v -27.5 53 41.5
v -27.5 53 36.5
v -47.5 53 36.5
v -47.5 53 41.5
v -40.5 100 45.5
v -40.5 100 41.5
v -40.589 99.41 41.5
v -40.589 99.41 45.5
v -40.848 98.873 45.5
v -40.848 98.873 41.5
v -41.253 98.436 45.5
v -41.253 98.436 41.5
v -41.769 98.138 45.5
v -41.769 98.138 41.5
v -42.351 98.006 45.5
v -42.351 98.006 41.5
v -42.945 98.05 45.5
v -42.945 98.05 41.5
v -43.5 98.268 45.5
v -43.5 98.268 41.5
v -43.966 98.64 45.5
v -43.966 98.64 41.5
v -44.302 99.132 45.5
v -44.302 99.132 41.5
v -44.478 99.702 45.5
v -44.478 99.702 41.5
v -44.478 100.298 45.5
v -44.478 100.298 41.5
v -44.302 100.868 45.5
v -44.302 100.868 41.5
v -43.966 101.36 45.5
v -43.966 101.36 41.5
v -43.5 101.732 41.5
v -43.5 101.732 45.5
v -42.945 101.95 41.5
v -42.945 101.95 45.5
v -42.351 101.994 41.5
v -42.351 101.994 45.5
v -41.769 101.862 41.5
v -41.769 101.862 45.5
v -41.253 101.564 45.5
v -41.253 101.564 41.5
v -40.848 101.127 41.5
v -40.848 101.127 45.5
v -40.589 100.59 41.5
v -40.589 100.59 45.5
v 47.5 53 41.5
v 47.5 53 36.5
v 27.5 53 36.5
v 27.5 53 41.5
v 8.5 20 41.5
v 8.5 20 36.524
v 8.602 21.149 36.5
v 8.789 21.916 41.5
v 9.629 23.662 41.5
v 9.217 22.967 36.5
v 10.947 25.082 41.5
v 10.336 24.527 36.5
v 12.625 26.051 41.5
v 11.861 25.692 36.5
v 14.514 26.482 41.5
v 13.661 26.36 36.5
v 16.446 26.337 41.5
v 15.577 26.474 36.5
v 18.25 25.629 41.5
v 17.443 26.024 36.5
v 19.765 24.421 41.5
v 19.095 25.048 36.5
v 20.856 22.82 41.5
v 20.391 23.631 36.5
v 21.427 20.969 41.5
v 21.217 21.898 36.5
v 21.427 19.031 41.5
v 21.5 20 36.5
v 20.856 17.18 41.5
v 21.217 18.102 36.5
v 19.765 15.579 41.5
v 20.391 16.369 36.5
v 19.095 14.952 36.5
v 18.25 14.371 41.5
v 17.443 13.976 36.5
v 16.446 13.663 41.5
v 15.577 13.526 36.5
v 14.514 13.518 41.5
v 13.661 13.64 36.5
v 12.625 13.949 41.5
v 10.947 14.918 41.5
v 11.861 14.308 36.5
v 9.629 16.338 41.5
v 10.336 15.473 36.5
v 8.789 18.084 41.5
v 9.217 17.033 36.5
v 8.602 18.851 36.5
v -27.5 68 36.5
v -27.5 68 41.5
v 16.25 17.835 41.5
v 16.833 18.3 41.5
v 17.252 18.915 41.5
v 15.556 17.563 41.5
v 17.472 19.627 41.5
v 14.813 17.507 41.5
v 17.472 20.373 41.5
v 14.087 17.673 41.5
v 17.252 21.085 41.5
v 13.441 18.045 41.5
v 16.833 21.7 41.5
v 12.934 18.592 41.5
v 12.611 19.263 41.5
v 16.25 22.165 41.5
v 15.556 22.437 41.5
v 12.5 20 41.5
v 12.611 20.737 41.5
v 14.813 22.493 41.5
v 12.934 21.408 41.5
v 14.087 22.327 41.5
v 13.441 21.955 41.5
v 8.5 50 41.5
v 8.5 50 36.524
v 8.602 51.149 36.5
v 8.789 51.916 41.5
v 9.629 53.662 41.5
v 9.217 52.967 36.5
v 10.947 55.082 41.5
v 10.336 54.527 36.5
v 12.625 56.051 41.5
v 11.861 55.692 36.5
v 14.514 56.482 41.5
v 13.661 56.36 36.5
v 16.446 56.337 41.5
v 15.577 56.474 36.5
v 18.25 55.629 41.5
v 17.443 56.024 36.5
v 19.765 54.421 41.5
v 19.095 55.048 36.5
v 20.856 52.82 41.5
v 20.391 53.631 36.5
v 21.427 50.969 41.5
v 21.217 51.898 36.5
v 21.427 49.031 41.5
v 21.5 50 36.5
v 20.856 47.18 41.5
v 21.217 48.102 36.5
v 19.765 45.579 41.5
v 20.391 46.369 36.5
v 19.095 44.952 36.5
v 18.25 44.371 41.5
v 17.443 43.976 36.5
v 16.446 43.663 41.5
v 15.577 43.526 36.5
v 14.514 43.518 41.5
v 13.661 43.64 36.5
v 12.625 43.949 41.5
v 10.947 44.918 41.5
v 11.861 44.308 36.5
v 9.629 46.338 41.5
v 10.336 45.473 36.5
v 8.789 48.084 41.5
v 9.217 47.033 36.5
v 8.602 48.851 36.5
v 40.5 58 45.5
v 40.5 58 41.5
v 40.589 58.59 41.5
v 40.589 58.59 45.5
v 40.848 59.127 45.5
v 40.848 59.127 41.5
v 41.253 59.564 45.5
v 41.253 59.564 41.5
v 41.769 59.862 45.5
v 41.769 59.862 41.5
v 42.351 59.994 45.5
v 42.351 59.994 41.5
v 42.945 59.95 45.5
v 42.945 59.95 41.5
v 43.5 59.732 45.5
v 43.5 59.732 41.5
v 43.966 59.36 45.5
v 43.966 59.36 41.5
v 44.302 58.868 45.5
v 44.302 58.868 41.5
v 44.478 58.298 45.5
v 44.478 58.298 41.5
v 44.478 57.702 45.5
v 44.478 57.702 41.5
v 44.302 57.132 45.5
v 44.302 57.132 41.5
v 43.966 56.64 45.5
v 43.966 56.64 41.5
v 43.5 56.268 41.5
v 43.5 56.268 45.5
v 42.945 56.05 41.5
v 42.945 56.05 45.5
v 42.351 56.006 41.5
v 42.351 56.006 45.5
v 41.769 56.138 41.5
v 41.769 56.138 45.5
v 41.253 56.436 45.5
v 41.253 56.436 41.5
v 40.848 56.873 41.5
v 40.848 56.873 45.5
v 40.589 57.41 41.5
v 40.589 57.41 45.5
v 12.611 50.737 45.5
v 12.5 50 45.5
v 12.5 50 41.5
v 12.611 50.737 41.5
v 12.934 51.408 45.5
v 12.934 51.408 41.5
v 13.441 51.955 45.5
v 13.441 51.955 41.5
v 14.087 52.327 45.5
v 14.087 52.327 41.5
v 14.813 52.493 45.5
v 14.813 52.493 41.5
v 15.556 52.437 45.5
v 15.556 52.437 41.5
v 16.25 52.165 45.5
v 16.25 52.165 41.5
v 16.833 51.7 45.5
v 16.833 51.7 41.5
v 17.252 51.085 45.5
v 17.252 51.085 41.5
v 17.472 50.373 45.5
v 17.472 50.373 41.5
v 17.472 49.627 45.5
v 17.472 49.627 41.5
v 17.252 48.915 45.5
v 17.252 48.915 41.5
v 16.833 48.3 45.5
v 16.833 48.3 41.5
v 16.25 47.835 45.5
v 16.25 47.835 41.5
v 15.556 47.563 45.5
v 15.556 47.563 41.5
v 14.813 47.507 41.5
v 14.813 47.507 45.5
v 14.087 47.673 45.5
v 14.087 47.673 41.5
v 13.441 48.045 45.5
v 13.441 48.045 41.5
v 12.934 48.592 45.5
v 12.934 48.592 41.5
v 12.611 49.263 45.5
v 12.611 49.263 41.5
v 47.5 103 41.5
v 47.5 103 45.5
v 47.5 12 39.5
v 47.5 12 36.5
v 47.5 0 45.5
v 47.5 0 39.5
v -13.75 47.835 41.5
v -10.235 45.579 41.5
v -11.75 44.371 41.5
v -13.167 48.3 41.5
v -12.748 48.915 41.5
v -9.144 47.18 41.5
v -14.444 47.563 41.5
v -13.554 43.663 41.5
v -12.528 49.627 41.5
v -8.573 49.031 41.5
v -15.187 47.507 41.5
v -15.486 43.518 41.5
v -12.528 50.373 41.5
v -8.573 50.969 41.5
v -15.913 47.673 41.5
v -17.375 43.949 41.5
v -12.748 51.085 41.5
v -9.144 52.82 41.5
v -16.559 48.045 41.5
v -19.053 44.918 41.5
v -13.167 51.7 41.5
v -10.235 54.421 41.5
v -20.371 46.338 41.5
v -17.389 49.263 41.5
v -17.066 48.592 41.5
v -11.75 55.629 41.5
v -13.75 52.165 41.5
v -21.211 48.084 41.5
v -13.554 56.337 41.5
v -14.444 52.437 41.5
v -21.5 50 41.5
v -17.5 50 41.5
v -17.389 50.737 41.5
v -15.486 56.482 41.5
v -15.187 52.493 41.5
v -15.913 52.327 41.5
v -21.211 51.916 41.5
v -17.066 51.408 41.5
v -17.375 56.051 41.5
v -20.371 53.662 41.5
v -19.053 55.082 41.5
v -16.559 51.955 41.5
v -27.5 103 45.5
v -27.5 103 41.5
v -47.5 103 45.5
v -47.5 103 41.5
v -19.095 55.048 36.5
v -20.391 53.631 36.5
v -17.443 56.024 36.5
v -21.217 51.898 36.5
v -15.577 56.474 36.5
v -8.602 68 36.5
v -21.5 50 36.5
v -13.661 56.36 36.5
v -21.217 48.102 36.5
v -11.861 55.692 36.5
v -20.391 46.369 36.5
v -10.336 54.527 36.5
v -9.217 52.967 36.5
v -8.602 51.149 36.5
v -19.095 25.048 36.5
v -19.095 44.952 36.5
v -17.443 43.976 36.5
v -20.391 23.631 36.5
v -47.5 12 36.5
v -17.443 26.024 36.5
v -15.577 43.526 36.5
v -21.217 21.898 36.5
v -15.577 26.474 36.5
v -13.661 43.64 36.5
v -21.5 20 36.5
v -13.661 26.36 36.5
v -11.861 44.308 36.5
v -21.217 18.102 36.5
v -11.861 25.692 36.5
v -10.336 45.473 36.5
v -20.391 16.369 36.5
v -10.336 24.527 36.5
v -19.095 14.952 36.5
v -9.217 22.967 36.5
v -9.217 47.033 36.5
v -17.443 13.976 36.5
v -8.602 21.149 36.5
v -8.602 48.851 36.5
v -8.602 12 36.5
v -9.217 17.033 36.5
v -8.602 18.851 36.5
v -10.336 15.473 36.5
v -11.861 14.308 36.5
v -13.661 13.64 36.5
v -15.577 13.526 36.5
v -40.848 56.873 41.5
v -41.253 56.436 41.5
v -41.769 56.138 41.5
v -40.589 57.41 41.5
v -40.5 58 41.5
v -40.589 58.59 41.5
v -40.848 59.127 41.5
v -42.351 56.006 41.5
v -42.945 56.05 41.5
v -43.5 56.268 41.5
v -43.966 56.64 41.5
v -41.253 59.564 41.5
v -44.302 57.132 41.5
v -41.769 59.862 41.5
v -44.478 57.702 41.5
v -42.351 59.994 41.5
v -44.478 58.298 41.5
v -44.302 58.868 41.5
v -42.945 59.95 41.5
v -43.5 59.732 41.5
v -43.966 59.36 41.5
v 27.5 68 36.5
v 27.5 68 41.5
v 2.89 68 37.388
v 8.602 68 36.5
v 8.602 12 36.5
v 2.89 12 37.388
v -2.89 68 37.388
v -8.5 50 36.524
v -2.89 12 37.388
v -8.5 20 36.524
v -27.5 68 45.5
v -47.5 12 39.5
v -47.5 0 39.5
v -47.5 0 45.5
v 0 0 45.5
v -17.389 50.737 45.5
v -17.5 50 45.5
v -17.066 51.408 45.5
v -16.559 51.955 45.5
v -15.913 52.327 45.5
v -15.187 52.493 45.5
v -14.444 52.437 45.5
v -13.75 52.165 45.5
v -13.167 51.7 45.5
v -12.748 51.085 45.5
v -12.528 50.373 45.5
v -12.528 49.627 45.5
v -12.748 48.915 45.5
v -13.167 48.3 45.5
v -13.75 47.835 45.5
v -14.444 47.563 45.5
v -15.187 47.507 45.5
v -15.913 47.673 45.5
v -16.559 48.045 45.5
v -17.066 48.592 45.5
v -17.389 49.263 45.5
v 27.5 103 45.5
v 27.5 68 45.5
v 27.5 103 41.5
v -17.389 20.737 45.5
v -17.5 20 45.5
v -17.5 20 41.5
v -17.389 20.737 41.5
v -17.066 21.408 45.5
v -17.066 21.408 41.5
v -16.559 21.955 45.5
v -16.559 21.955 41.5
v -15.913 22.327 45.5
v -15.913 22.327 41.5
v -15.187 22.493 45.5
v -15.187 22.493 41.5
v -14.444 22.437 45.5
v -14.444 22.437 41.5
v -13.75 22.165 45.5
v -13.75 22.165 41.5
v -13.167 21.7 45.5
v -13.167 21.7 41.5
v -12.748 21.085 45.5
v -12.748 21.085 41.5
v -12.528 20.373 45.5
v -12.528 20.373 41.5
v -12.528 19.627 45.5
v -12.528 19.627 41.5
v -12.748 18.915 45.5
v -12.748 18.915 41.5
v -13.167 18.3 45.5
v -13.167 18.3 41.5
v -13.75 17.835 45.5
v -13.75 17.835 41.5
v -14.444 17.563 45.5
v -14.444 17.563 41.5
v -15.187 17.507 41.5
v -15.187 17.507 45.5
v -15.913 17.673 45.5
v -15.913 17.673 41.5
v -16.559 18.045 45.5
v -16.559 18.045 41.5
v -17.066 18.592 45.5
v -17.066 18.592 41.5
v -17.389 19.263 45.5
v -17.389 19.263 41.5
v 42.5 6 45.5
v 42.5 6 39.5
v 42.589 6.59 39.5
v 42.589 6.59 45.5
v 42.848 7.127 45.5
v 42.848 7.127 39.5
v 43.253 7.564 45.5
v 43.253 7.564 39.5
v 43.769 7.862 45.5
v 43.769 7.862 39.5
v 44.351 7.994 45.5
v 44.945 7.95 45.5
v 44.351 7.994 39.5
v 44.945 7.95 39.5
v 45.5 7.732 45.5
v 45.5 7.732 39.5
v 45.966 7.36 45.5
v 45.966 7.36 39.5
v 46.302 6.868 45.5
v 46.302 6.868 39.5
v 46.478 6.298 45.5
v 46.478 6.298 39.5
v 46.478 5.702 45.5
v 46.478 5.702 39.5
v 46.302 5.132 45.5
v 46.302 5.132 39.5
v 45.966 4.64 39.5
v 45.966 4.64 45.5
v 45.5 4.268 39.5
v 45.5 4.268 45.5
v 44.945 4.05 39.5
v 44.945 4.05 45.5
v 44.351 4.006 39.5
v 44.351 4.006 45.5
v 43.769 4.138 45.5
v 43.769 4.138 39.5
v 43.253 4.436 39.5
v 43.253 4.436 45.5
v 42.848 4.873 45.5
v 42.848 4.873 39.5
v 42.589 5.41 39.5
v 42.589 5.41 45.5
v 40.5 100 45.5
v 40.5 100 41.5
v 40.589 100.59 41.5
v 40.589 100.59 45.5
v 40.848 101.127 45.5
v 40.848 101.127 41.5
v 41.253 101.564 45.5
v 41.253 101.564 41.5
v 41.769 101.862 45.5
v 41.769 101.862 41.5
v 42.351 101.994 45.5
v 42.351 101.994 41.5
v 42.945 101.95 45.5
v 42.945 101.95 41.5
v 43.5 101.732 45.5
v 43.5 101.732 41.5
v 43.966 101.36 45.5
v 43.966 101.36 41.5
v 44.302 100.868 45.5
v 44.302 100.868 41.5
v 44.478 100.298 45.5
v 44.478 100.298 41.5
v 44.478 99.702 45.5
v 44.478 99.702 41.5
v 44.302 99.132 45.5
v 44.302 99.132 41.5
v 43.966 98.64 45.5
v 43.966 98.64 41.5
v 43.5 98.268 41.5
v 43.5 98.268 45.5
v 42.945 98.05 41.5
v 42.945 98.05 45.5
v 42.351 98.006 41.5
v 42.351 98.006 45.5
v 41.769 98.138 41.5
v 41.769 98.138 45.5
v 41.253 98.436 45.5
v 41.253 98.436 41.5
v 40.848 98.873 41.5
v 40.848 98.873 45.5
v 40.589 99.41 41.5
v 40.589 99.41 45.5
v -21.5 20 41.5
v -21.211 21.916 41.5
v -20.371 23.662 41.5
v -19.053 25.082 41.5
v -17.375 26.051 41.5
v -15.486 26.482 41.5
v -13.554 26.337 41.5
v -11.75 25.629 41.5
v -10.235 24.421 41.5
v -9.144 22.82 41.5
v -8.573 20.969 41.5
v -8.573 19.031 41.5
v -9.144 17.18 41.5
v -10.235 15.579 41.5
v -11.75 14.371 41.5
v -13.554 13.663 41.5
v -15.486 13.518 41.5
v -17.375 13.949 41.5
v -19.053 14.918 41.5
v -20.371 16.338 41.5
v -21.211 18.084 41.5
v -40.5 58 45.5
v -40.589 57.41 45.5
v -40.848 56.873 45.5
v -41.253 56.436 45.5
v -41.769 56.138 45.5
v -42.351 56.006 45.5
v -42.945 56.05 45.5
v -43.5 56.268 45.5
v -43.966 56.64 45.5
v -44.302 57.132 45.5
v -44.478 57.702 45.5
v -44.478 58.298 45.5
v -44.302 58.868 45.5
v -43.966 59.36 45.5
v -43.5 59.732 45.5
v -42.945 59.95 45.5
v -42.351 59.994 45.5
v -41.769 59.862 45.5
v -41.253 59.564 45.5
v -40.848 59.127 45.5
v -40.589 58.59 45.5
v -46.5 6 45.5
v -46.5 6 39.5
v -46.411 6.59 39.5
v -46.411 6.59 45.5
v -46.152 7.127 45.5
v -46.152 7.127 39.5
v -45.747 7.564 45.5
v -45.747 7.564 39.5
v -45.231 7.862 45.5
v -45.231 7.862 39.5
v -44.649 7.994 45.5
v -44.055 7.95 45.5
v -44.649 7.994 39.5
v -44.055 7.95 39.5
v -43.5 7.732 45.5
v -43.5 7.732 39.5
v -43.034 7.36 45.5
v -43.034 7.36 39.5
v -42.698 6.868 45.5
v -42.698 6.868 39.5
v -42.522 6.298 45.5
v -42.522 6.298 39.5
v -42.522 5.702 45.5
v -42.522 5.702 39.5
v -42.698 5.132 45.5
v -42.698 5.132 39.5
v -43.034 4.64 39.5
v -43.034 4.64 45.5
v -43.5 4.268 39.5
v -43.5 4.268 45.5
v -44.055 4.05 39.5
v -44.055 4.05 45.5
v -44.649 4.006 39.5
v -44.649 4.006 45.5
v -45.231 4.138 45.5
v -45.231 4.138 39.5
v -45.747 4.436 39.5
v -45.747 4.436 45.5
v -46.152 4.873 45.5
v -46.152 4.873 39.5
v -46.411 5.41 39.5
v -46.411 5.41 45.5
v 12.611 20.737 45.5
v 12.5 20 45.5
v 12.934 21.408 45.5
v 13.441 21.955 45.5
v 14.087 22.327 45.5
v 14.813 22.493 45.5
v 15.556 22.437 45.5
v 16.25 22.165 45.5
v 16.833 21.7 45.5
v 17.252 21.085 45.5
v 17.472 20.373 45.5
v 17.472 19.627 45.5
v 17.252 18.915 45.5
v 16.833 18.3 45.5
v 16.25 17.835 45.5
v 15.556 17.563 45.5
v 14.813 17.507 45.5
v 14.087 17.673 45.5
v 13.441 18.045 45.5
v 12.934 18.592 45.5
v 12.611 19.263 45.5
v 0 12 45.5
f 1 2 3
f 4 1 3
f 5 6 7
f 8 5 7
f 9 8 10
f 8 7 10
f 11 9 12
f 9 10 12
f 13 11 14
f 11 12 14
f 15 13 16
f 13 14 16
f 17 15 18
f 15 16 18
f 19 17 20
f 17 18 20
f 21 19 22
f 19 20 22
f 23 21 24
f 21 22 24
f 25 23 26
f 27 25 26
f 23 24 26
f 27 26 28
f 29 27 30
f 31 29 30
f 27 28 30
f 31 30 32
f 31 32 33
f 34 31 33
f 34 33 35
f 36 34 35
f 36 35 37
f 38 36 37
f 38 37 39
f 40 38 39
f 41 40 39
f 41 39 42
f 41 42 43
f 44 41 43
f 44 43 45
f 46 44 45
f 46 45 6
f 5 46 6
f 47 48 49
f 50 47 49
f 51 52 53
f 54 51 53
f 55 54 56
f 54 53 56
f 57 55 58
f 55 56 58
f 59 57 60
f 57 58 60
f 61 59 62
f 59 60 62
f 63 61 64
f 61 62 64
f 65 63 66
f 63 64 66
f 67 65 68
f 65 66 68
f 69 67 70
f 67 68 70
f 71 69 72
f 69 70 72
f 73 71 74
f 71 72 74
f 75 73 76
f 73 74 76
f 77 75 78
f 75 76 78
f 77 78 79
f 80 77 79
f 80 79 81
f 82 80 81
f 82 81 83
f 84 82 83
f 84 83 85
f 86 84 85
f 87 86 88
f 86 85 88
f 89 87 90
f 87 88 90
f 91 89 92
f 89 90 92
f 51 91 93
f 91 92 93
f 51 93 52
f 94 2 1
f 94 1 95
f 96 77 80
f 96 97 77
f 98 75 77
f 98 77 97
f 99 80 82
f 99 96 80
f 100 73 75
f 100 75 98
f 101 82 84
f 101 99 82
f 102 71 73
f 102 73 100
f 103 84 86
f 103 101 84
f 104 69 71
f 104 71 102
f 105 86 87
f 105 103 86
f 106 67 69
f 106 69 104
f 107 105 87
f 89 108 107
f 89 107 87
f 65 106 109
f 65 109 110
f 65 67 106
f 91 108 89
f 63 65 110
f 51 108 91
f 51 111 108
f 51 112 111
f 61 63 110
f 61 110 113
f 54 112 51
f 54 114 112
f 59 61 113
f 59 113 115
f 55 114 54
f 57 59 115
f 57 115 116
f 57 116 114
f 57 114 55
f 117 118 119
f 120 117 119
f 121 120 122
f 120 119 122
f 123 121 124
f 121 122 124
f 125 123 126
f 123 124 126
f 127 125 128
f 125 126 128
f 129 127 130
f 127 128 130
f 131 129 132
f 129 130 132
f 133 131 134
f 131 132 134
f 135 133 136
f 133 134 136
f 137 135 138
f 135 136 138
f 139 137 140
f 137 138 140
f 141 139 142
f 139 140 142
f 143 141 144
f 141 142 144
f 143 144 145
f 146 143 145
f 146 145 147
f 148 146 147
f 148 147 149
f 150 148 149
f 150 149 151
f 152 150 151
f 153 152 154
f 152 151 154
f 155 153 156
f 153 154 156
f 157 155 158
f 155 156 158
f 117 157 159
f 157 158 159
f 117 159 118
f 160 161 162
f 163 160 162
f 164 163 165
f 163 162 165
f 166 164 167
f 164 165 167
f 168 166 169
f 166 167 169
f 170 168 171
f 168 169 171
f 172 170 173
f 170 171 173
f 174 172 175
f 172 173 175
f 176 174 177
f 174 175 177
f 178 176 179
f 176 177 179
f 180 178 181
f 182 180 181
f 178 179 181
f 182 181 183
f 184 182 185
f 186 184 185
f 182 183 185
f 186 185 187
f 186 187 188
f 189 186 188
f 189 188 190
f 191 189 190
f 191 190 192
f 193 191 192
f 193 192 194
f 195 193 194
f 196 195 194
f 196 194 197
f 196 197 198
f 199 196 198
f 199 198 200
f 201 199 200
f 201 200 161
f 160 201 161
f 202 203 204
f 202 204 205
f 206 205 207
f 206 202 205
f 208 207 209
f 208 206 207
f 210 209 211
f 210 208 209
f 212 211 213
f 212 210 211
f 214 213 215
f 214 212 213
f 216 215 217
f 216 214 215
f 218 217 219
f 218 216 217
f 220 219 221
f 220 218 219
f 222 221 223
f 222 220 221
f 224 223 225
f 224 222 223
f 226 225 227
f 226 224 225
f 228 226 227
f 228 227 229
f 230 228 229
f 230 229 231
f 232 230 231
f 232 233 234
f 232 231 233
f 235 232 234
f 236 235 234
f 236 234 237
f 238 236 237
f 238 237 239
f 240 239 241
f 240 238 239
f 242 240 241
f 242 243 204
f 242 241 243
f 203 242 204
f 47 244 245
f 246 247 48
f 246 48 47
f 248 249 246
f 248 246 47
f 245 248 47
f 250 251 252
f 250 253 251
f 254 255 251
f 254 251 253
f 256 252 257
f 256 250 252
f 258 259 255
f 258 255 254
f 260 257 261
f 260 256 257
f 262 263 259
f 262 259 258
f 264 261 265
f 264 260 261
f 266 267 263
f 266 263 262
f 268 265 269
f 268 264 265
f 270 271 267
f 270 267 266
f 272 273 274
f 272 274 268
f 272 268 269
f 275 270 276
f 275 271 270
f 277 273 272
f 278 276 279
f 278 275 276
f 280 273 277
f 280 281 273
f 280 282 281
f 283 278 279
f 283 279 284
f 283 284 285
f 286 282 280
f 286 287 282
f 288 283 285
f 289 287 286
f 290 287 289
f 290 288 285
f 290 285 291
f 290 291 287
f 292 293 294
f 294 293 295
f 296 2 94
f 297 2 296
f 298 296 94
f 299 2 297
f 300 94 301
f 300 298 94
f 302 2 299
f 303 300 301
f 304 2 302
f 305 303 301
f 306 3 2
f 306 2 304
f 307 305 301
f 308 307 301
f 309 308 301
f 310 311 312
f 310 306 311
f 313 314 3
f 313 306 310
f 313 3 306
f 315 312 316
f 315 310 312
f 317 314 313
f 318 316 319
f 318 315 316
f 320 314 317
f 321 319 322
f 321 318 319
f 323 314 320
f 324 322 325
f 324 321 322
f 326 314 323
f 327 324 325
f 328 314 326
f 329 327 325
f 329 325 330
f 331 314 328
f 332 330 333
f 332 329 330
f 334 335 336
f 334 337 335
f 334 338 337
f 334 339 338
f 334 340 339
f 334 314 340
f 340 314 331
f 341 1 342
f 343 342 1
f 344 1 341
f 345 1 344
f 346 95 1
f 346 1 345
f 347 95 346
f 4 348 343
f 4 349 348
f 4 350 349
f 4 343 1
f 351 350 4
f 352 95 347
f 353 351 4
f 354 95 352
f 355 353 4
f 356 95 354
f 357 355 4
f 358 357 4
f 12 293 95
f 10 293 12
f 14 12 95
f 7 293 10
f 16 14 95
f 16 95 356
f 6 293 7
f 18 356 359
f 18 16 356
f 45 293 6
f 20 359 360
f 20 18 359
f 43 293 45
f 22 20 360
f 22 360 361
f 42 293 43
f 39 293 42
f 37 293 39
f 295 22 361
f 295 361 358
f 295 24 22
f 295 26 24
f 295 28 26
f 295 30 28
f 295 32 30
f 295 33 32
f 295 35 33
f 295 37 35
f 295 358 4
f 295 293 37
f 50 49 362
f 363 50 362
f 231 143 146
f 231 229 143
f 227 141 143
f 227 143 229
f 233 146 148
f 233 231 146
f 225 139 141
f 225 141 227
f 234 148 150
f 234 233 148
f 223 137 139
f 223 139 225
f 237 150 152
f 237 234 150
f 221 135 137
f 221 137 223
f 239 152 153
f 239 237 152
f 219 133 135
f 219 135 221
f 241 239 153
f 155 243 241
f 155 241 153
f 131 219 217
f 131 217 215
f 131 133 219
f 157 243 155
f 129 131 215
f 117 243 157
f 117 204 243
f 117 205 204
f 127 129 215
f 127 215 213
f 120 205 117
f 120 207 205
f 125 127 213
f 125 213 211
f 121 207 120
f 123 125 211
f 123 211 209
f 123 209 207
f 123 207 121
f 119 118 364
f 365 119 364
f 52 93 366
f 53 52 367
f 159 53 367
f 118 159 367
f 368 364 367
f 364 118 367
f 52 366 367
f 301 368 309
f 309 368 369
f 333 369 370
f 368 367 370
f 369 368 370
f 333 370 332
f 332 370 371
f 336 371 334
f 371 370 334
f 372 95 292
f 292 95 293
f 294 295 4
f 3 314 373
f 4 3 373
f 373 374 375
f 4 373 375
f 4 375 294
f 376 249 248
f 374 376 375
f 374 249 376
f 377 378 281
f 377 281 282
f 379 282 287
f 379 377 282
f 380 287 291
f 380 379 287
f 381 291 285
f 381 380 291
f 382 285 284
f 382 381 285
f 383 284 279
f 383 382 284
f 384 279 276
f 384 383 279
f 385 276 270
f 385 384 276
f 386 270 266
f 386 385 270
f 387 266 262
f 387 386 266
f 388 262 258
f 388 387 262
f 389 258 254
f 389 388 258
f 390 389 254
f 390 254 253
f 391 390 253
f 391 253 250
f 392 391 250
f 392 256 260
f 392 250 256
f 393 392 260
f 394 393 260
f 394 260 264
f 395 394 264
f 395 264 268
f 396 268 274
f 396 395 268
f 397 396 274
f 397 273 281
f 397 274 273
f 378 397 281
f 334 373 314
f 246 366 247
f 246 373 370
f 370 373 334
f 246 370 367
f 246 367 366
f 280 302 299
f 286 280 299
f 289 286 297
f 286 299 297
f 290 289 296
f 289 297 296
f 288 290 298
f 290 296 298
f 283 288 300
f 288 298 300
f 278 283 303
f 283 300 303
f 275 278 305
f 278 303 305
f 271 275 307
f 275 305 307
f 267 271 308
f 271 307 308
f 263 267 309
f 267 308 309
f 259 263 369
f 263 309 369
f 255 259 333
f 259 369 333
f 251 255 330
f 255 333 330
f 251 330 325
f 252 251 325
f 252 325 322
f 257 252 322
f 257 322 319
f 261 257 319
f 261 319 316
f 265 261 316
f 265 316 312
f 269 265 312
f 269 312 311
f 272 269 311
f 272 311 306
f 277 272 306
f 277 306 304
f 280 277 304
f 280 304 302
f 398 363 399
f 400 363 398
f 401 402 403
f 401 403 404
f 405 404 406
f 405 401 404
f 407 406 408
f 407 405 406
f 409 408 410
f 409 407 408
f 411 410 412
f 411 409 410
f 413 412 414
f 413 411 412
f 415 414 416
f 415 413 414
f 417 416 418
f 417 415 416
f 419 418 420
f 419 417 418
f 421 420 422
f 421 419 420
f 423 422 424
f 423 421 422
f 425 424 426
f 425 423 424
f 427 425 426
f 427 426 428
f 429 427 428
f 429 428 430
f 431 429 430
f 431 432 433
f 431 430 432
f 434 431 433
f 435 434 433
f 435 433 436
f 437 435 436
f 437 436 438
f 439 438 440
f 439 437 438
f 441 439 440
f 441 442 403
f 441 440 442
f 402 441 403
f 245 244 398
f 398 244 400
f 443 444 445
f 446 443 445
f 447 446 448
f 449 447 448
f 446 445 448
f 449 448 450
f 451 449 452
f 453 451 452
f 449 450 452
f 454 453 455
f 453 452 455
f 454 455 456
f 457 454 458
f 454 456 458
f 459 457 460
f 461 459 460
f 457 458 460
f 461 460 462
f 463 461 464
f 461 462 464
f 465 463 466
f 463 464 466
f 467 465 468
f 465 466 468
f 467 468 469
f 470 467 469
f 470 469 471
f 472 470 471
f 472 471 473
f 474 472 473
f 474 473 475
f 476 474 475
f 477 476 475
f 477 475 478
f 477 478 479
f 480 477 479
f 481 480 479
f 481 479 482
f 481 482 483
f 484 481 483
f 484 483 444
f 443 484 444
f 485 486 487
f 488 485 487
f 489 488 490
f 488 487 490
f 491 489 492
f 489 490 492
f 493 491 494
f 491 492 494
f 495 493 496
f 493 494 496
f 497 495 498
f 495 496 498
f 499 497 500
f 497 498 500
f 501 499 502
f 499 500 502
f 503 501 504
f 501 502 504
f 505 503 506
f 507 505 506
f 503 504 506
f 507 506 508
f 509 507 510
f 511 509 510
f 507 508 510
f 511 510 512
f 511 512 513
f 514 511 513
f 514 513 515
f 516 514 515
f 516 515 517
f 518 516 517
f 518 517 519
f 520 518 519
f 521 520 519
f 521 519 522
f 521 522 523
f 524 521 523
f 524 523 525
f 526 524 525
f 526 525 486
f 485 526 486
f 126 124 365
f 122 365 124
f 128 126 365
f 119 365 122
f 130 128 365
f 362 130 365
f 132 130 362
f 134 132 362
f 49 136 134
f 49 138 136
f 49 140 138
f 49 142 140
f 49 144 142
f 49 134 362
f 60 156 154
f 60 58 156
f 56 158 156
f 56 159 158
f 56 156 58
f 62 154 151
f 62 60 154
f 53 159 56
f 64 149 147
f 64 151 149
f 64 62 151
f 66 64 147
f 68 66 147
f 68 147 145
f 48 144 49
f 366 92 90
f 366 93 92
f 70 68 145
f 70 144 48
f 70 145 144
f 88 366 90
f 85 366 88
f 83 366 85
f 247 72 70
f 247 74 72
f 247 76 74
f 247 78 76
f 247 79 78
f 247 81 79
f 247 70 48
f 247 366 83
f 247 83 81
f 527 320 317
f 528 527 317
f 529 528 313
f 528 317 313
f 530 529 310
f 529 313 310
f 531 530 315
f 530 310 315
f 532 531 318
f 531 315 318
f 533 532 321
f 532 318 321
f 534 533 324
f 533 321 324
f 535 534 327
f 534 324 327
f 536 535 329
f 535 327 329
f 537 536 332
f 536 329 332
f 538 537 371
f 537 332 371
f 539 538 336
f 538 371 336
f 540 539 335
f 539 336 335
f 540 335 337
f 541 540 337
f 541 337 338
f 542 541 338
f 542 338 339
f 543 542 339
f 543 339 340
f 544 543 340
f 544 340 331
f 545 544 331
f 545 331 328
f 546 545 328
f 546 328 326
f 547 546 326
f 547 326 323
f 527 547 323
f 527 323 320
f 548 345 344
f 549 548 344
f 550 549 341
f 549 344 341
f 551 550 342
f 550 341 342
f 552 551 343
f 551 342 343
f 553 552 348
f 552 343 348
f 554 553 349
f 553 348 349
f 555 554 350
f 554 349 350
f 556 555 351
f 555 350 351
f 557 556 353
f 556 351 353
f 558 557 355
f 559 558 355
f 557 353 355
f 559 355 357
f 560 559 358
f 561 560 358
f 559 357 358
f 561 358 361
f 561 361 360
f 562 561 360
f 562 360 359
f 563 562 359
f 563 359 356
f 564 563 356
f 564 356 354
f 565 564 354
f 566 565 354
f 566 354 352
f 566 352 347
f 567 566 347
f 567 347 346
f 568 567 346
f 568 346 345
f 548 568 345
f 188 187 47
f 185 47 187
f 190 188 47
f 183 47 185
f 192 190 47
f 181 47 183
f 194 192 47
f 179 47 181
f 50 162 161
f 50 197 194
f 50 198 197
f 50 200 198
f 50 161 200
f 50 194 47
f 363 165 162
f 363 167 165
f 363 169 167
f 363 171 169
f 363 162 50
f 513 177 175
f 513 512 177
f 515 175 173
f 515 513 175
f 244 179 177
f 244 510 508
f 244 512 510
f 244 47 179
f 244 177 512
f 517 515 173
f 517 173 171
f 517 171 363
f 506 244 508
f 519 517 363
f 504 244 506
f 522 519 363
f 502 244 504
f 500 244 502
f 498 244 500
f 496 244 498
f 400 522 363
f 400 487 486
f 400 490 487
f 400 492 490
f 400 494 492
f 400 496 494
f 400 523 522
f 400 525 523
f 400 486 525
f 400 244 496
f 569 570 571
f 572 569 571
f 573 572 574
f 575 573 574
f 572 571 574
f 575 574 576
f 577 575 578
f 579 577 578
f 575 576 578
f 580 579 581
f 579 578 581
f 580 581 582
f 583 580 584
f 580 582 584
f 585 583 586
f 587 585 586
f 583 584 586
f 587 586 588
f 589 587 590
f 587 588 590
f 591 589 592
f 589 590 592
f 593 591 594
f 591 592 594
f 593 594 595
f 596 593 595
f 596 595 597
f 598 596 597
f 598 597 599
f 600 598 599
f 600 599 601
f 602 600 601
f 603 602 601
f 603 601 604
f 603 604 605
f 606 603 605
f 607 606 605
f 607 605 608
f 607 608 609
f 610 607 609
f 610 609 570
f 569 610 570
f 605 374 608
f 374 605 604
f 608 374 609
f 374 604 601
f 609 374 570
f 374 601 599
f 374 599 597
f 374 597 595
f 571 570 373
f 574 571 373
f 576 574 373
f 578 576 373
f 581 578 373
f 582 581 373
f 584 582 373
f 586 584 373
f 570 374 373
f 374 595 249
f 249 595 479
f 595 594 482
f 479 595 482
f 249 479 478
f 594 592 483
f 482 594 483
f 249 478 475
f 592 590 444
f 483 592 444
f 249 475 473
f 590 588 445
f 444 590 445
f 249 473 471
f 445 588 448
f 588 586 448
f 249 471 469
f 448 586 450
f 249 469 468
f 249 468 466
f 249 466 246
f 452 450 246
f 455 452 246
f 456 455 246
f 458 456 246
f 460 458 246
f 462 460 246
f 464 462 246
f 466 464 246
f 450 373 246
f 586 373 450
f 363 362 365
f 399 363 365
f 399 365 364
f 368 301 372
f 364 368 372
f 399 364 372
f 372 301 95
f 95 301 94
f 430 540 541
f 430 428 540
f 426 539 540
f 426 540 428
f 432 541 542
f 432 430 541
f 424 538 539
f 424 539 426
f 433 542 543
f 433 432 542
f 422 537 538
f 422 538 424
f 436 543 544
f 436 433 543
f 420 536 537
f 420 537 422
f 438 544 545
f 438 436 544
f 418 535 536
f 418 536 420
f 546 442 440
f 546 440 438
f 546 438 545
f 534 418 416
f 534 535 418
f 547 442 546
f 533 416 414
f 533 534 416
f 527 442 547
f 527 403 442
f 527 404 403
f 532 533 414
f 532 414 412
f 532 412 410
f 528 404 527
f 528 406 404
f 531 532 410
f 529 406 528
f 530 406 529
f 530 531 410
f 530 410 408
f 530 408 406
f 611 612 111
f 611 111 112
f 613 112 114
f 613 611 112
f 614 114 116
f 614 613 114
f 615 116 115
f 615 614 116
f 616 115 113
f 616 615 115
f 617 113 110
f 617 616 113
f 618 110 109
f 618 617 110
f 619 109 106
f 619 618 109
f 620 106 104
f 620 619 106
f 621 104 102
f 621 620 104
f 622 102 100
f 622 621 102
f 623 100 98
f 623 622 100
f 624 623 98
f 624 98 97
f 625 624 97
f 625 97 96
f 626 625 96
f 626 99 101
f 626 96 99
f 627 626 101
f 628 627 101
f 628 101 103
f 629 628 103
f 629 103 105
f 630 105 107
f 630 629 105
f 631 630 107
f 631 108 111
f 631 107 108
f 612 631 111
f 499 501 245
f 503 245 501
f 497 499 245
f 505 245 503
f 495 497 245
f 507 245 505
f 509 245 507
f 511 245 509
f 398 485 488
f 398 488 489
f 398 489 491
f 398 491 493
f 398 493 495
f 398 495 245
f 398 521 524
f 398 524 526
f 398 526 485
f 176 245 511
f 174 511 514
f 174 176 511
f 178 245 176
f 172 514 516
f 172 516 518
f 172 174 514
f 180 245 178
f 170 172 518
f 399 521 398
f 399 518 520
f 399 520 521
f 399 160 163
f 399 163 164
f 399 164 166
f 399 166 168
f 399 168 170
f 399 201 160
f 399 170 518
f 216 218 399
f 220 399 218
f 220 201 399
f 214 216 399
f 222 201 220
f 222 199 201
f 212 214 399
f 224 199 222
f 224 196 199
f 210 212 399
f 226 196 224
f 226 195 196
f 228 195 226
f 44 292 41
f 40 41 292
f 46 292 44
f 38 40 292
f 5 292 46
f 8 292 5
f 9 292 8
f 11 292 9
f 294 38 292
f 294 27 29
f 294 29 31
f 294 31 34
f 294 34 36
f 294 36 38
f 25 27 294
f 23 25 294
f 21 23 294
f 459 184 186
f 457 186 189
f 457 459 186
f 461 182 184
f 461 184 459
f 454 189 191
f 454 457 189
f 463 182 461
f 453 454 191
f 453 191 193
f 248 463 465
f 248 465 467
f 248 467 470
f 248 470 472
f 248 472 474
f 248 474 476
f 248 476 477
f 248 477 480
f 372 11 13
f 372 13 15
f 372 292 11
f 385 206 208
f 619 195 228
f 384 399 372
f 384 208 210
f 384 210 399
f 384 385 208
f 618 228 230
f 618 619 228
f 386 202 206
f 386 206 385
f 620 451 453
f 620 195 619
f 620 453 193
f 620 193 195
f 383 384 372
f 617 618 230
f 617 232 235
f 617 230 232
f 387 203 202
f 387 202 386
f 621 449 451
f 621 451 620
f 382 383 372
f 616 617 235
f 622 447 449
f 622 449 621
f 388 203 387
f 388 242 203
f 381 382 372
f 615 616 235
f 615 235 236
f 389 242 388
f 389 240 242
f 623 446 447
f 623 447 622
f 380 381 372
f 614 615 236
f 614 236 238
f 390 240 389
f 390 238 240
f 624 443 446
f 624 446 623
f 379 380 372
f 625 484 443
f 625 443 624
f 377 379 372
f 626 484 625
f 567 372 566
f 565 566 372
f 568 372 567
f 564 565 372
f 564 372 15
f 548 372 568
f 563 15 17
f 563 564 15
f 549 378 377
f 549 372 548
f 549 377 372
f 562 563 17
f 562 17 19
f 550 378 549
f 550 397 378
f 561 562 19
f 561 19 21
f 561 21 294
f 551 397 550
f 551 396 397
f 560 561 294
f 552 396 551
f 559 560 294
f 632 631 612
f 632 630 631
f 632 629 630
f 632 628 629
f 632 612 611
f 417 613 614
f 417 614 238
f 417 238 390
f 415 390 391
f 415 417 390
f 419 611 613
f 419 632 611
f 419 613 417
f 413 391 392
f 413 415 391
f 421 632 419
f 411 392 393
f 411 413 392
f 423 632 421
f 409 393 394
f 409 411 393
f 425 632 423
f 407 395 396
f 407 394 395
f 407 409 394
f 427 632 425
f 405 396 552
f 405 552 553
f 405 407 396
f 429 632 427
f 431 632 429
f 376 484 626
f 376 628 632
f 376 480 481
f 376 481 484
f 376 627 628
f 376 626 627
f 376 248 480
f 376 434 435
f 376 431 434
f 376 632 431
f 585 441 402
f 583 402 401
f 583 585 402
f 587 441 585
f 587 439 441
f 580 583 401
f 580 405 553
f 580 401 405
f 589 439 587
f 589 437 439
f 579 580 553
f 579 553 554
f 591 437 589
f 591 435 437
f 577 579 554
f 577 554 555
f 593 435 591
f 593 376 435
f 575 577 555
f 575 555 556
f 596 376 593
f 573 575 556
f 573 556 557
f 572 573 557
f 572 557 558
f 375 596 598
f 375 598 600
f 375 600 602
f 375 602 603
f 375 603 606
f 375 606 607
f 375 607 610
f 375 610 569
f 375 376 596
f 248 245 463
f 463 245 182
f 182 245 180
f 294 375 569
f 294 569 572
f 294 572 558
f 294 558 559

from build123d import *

# Parameters (mm, degrees)
SKETCH1_R                = 37.5
BOSS_EXTRUDE1_DEPTH      = 12
SKETCH2_R                = 30
BOSS_EXTRUDE2_DEPTH      = 56
BOSS_EXTRUDE3_DEPTH      = 5
BOSS_EXTRUDE3_DEPTH_BACK = 1
SKETCH4_W                = 75
SKETCH4_H                = 15
SKETCH4_R                = 3.5
MOVE_FACE3_BY            = 10
MOVE_FACE3_2_BY          = 10
BOSS_EXTRUDE4_DEPTH      = 12
BOSS_EXTRUDE5_DEPTH      = 68
MOVE_FACE1_BY            = 10
SKETCH11_W               = 95
SKETCH11_H               = 15
BOSS_EXTRUDE7_DEPTH      = 20
CUT_EXTRUDE1_DEPTH       = 103.720494547
CUT_EXTRUDE1_DEPTH_BACK  = 103.720494547
SKETCH12_R               = 2.5
SKETCH13_R               = 6.5
CUT_EXTRUDE2_DEPTH       = 5
MOVE_FACE2_BY            = 7
DELETEFACE1_START        = -20
DELETEFACE1_OUTLINE_W    = 95
DELETEFACE1_OUTLINE_H    = 8
DELETEFACE1_DEPTH        = 20
CUT_EXTRUDE3_DEPTH       = 103.359660059
CUT_EXTRUDE3_DEPTH_BACK  = 3
SKETCH15_R               = 2
CUT_EXTRUDE4_DEPTH       = 96.818839484
MOVE_FACE4_BY            = 20
SKETCH16_W               = 55
SKETCH16_H               = 35
CUT_EXTRUDE5_DEPTH       = 10
SKETCH17_W               = 20
SKETCH17_H               = 50
CUT_EXTRUDE6_DEPTH       = 5
SKETCH18_R               = 2
CUT_EXTRUDE7_DEPTH       = 114.535236825


# Read off the part's stored shape, not the designer's step: DeleteFace1
with BuildPart() as part:
    # Sketch1 → Boss-Extrude1 (new body)
    with BuildSketch(Plane(origin=(0, 0, 0), x_dir=(1, 0, 0), z_dir=(0, 1, 0))):
        with Locations(Location((0, 0, 0), (0, 0, 270))):
            Circle(SKETCH1_R)
    extrude(amount=BOSS_EXTRUDE1_DEPTH)

    # Sketch2 → Boss-Extrude2 (add)
    with BuildSketch(Plane(origin=(0, 12, 0), x_dir=(1, 0, 0), z_dir=(0, 1, 0))):
        with Locations(Location((0, 0, 0), (0, 0, 270))):
            Circle(SKETCH2_R)
    extrude(amount=BOSS_EXTRUDE2_DEPTH)


with BuildPart() as body_2:
    # Sketch4 → Boss-Extrude3 (new, two sides: drawn at the far end of the back side and taken through both)
    with BuildSketch(Plane.XY.offset(37.5).offset(-BOSS_EXTRUDE3_DEPTH_BACK)):
        with Locations((0, 75.5)):
            Rectangle(SKETCH4_W, SKETCH4_H)
        with Locations((0, 76)):
            Circle(SKETCH4_R, mode=Mode.SUBTRACT)
    extrude(amount=BOSS_EXTRUDE3_DEPTH + BOSS_EXTRUDE3_DEPTH_BACK)

    # Move Face3: a face moved outward by 10.0
    extrude(body_2.faces().sort_by_distance((-37.5, 75.5, 39.5))[0], amount=MOVE_FACE3_BY, dir=(-1, 0, 0))

    # Move Face3 2: a face moved outward by 10.0
    extrude(body_2.faces().sort_by_distance((37.5, 75.5, 39.5))[0], amount=MOVE_FACE3_2_BY, dir=(1, 0, 0))



with BuildPart() as body_3:
    # Sketch6 → Boss-Extrude4 (new body)
    with BuildSketch(Plane.XZ):
        with BuildLine():
            Line((42.5, 0), (37.5, 0))
            ThreePointArc((37.5, 0), (0, 37.5), (-37.5, 0))
            Line((-37.5, 0), (-42.5, 0))
            ThreePointArc((-42.5, 0), (0, 42.5), (42.5, 0))
        make_face()
    extrude(amount=-BOSS_EXTRUDE4_DEPTH)


with BuildPart() as body_2_1:
    add(body_2.part)

    add(body_3.part)  # Boss-Extrude5 merges body 3
    # Sketch7 → Boss-Extrude5 (add)
    with BuildSketch(Plane.XZ.offset(-68)):
        with BuildLine():
            Line((8.602325267, 36.5), (47.5, 36.5))
            Line((47.5, 36.5), (47.5, 42.5))
            Line((47.5, 42.5), (-47.5, 42.5))
            Line((-47.5, 42.5), (-47.5, 36.5))
            Line((-47.5, 36.5), (-8.602325267, 36.5))
            ThreePointArc((-8.602325267, 36.5), (0, 37.5), (8.602325267, 36.5))
        make_face()
    extrude(amount=BOSS_EXTRUDE5_DEPTH)

    # Move Face1: a face moved outward by 10.0
    extrude(body_2_1.faces().sort_by_distance((0, 41.330789145, 42.5))[0], amount=MOVE_FACE1_BY, dir=(0, 0, 1))

    # Sketch11 → Boss-Extrude7 (add)
    with BuildSketch(Plane.XZ):
        with Locations((0, 45)):
            Rectangle(SKETCH11_W, SKETCH11_H)
    extrude(amount=BOSS_EXTRUDE7_DEPTH)

    # Sketch12 → Cut-Extrude1 (cut, two sides: drawn at the far end of the back side and taken through both)
    with BuildSketch(Plane(origin=(0, 0, 37.5), x_dir=(-1, 0, 0), z_dir=(0, 0, -1)).offset(-CUT_EXTRUDE1_DEPTH_BACK)):
        with Locations((-15, 20)):
            Circle(SKETCH12_R)
        with Locations((15, 20)):
            Circle(SKETCH12_R)
        with Locations((-15, 50)):
            Circle(SKETCH12_R)
        with Locations((15, 50)):
            Circle(SKETCH12_R)
    extrude(amount=CUT_EXTRUDE1_DEPTH + CUT_EXTRUDE1_DEPTH_BACK, mode=Mode.SUBTRACT)

    # Sketch13 → Cut-Extrude2 (cut)
    with BuildSketch(Plane(origin=(0, 0, 36.5), x_dir=(-1, 0, 0), z_dir=(0, 0, -1))):
        with Locations((-15, 50)):
            Circle(SKETCH13_R)
        with Locations((15, 50)):
            Circle(SKETCH13_R)
        with Locations((-15, 20)):
            Circle(SKETCH13_R)
        with Locations((15, 20)):
            Circle(SKETCH13_R)
    extrude(amount=-CUT_EXTRUDE2_DEPTH, mode=Mode.SUBTRACT)

    # Move Face2: a face moved inward by 7.0
    extrude(body_2_1.faces().sort_by_distance((0, 31.294429556, 52.5))[0], amount=MOVE_FACE2_BY, dir=(0, 0, -1), mode=Mode.SUBTRACT)

    # DeleteFace1 outline → DeleteFace1 (cut)
    with BuildSketch(Plane(origin=(0, 0, 0), x_dir=(1, 0, 0), z_dir=(0, 1, 0)).offset(DELETEFACE1_START)):
        with Locations((0, -41.5)):
            Rectangle(DELETEFACE1_OUTLINE_W, DELETEFACE1_OUTLINE_H)
    extrude(amount=DELETEFACE1_DEPTH, mode=Mode.SUBTRACT)

    # Sketch14 → Cut-Extrude3 (cut, two sides: drawn at the far end of the back side and taken through both)
    with BuildSketch(Plane(origin=(0, 0, 36.5), x_dir=(-1, 0, 0), z_dir=(0, 0, -1)).offset(-CUT_EXTRUDE3_DEPTH_BACK)):
        Polygon((47.5, 0), (-42.5, 0), (-47.5, 0), (-47.5, 12), (-42.5, 12), (47.5, 12), align=None)
    extrude(amount=CUT_EXTRUDE3_DEPTH + CUT_EXTRUDE3_DEPTH_BACK, mode=Mode.SUBTRACT)

    # Sketch15 → Cut-Extrude4 (cut, through all)
    with BuildSketch(Plane(origin=(0, 0, 39.5), x_dir=(-1, 0, 0), z_dir=(0, 0, -1))):
        with Locations((44.5, 6)):
            Circle(SKETCH15_R)
        with Locations((-44.5, 6)):
            Circle(SKETCH15_R)
    extrude(amount=-CUT_EXTRUDE4_DEPTH, mode=Mode.SUBTRACT)

    # Move Face4: a face moved outward by 20.0
    extrude(body_2_1.faces().sort_by_distance((0, 83, 41))[0], amount=MOVE_FACE4_BY, dir=(0, 1, 0))

    # Sketch16 → Cut-Extrude5 (cut)
    with BuildSketch(Plane(origin=(0, 0, 36.5), x_dir=(-1, 0, 0), z_dir=(0, 0, -1))):
        with Locations((0, 85.5)):
            Rectangle(SKETCH16_W, SKETCH16_H)
    extrude(amount=-CUT_EXTRUDE5_DEPTH, mode=Mode.SUBTRACT)

    # Sketch17 → Cut-Extrude6 (cut)
    with BuildSketch(Plane(origin=(0, 0, 36.5), x_dir=(-1, 0, 0), z_dir=(0, 0, -1))):
        with Locations((37.5, 78)):
            Rectangle(SKETCH17_W, SKETCH17_H)
        with Locations((-37.5, 78)):
            Rectangle(SKETCH17_W, SKETCH17_H)
    extrude(amount=-CUT_EXTRUDE6_DEPTH, mode=Mode.SUBTRACT)

    # Sketch18 → Cut-Extrude7 (cut, through all)
    with BuildSketch(Plane(origin=(0, 0, 41.5), x_dir=(-1, 0, 0), z_dir=(0, 0, -1))):
        with Locations((-42.5, 58)):
            Circle(SKETCH18_R)
        with Locations((-42.5, 100)):
            Circle(SKETCH18_R)
        with Locations(Location((42.5, 100, 0), (0, 0, 180))):
            Circle(SKETCH18_R)
        with Locations(Location((42.5, 58, 0), (0, 0, 180))):
            Circle(SKETCH18_R)
    extrude(amount=-CUT_EXTRUDE7_DEPTH, mode=Mode.SUBTRACT)


solid = body_2_1.part
